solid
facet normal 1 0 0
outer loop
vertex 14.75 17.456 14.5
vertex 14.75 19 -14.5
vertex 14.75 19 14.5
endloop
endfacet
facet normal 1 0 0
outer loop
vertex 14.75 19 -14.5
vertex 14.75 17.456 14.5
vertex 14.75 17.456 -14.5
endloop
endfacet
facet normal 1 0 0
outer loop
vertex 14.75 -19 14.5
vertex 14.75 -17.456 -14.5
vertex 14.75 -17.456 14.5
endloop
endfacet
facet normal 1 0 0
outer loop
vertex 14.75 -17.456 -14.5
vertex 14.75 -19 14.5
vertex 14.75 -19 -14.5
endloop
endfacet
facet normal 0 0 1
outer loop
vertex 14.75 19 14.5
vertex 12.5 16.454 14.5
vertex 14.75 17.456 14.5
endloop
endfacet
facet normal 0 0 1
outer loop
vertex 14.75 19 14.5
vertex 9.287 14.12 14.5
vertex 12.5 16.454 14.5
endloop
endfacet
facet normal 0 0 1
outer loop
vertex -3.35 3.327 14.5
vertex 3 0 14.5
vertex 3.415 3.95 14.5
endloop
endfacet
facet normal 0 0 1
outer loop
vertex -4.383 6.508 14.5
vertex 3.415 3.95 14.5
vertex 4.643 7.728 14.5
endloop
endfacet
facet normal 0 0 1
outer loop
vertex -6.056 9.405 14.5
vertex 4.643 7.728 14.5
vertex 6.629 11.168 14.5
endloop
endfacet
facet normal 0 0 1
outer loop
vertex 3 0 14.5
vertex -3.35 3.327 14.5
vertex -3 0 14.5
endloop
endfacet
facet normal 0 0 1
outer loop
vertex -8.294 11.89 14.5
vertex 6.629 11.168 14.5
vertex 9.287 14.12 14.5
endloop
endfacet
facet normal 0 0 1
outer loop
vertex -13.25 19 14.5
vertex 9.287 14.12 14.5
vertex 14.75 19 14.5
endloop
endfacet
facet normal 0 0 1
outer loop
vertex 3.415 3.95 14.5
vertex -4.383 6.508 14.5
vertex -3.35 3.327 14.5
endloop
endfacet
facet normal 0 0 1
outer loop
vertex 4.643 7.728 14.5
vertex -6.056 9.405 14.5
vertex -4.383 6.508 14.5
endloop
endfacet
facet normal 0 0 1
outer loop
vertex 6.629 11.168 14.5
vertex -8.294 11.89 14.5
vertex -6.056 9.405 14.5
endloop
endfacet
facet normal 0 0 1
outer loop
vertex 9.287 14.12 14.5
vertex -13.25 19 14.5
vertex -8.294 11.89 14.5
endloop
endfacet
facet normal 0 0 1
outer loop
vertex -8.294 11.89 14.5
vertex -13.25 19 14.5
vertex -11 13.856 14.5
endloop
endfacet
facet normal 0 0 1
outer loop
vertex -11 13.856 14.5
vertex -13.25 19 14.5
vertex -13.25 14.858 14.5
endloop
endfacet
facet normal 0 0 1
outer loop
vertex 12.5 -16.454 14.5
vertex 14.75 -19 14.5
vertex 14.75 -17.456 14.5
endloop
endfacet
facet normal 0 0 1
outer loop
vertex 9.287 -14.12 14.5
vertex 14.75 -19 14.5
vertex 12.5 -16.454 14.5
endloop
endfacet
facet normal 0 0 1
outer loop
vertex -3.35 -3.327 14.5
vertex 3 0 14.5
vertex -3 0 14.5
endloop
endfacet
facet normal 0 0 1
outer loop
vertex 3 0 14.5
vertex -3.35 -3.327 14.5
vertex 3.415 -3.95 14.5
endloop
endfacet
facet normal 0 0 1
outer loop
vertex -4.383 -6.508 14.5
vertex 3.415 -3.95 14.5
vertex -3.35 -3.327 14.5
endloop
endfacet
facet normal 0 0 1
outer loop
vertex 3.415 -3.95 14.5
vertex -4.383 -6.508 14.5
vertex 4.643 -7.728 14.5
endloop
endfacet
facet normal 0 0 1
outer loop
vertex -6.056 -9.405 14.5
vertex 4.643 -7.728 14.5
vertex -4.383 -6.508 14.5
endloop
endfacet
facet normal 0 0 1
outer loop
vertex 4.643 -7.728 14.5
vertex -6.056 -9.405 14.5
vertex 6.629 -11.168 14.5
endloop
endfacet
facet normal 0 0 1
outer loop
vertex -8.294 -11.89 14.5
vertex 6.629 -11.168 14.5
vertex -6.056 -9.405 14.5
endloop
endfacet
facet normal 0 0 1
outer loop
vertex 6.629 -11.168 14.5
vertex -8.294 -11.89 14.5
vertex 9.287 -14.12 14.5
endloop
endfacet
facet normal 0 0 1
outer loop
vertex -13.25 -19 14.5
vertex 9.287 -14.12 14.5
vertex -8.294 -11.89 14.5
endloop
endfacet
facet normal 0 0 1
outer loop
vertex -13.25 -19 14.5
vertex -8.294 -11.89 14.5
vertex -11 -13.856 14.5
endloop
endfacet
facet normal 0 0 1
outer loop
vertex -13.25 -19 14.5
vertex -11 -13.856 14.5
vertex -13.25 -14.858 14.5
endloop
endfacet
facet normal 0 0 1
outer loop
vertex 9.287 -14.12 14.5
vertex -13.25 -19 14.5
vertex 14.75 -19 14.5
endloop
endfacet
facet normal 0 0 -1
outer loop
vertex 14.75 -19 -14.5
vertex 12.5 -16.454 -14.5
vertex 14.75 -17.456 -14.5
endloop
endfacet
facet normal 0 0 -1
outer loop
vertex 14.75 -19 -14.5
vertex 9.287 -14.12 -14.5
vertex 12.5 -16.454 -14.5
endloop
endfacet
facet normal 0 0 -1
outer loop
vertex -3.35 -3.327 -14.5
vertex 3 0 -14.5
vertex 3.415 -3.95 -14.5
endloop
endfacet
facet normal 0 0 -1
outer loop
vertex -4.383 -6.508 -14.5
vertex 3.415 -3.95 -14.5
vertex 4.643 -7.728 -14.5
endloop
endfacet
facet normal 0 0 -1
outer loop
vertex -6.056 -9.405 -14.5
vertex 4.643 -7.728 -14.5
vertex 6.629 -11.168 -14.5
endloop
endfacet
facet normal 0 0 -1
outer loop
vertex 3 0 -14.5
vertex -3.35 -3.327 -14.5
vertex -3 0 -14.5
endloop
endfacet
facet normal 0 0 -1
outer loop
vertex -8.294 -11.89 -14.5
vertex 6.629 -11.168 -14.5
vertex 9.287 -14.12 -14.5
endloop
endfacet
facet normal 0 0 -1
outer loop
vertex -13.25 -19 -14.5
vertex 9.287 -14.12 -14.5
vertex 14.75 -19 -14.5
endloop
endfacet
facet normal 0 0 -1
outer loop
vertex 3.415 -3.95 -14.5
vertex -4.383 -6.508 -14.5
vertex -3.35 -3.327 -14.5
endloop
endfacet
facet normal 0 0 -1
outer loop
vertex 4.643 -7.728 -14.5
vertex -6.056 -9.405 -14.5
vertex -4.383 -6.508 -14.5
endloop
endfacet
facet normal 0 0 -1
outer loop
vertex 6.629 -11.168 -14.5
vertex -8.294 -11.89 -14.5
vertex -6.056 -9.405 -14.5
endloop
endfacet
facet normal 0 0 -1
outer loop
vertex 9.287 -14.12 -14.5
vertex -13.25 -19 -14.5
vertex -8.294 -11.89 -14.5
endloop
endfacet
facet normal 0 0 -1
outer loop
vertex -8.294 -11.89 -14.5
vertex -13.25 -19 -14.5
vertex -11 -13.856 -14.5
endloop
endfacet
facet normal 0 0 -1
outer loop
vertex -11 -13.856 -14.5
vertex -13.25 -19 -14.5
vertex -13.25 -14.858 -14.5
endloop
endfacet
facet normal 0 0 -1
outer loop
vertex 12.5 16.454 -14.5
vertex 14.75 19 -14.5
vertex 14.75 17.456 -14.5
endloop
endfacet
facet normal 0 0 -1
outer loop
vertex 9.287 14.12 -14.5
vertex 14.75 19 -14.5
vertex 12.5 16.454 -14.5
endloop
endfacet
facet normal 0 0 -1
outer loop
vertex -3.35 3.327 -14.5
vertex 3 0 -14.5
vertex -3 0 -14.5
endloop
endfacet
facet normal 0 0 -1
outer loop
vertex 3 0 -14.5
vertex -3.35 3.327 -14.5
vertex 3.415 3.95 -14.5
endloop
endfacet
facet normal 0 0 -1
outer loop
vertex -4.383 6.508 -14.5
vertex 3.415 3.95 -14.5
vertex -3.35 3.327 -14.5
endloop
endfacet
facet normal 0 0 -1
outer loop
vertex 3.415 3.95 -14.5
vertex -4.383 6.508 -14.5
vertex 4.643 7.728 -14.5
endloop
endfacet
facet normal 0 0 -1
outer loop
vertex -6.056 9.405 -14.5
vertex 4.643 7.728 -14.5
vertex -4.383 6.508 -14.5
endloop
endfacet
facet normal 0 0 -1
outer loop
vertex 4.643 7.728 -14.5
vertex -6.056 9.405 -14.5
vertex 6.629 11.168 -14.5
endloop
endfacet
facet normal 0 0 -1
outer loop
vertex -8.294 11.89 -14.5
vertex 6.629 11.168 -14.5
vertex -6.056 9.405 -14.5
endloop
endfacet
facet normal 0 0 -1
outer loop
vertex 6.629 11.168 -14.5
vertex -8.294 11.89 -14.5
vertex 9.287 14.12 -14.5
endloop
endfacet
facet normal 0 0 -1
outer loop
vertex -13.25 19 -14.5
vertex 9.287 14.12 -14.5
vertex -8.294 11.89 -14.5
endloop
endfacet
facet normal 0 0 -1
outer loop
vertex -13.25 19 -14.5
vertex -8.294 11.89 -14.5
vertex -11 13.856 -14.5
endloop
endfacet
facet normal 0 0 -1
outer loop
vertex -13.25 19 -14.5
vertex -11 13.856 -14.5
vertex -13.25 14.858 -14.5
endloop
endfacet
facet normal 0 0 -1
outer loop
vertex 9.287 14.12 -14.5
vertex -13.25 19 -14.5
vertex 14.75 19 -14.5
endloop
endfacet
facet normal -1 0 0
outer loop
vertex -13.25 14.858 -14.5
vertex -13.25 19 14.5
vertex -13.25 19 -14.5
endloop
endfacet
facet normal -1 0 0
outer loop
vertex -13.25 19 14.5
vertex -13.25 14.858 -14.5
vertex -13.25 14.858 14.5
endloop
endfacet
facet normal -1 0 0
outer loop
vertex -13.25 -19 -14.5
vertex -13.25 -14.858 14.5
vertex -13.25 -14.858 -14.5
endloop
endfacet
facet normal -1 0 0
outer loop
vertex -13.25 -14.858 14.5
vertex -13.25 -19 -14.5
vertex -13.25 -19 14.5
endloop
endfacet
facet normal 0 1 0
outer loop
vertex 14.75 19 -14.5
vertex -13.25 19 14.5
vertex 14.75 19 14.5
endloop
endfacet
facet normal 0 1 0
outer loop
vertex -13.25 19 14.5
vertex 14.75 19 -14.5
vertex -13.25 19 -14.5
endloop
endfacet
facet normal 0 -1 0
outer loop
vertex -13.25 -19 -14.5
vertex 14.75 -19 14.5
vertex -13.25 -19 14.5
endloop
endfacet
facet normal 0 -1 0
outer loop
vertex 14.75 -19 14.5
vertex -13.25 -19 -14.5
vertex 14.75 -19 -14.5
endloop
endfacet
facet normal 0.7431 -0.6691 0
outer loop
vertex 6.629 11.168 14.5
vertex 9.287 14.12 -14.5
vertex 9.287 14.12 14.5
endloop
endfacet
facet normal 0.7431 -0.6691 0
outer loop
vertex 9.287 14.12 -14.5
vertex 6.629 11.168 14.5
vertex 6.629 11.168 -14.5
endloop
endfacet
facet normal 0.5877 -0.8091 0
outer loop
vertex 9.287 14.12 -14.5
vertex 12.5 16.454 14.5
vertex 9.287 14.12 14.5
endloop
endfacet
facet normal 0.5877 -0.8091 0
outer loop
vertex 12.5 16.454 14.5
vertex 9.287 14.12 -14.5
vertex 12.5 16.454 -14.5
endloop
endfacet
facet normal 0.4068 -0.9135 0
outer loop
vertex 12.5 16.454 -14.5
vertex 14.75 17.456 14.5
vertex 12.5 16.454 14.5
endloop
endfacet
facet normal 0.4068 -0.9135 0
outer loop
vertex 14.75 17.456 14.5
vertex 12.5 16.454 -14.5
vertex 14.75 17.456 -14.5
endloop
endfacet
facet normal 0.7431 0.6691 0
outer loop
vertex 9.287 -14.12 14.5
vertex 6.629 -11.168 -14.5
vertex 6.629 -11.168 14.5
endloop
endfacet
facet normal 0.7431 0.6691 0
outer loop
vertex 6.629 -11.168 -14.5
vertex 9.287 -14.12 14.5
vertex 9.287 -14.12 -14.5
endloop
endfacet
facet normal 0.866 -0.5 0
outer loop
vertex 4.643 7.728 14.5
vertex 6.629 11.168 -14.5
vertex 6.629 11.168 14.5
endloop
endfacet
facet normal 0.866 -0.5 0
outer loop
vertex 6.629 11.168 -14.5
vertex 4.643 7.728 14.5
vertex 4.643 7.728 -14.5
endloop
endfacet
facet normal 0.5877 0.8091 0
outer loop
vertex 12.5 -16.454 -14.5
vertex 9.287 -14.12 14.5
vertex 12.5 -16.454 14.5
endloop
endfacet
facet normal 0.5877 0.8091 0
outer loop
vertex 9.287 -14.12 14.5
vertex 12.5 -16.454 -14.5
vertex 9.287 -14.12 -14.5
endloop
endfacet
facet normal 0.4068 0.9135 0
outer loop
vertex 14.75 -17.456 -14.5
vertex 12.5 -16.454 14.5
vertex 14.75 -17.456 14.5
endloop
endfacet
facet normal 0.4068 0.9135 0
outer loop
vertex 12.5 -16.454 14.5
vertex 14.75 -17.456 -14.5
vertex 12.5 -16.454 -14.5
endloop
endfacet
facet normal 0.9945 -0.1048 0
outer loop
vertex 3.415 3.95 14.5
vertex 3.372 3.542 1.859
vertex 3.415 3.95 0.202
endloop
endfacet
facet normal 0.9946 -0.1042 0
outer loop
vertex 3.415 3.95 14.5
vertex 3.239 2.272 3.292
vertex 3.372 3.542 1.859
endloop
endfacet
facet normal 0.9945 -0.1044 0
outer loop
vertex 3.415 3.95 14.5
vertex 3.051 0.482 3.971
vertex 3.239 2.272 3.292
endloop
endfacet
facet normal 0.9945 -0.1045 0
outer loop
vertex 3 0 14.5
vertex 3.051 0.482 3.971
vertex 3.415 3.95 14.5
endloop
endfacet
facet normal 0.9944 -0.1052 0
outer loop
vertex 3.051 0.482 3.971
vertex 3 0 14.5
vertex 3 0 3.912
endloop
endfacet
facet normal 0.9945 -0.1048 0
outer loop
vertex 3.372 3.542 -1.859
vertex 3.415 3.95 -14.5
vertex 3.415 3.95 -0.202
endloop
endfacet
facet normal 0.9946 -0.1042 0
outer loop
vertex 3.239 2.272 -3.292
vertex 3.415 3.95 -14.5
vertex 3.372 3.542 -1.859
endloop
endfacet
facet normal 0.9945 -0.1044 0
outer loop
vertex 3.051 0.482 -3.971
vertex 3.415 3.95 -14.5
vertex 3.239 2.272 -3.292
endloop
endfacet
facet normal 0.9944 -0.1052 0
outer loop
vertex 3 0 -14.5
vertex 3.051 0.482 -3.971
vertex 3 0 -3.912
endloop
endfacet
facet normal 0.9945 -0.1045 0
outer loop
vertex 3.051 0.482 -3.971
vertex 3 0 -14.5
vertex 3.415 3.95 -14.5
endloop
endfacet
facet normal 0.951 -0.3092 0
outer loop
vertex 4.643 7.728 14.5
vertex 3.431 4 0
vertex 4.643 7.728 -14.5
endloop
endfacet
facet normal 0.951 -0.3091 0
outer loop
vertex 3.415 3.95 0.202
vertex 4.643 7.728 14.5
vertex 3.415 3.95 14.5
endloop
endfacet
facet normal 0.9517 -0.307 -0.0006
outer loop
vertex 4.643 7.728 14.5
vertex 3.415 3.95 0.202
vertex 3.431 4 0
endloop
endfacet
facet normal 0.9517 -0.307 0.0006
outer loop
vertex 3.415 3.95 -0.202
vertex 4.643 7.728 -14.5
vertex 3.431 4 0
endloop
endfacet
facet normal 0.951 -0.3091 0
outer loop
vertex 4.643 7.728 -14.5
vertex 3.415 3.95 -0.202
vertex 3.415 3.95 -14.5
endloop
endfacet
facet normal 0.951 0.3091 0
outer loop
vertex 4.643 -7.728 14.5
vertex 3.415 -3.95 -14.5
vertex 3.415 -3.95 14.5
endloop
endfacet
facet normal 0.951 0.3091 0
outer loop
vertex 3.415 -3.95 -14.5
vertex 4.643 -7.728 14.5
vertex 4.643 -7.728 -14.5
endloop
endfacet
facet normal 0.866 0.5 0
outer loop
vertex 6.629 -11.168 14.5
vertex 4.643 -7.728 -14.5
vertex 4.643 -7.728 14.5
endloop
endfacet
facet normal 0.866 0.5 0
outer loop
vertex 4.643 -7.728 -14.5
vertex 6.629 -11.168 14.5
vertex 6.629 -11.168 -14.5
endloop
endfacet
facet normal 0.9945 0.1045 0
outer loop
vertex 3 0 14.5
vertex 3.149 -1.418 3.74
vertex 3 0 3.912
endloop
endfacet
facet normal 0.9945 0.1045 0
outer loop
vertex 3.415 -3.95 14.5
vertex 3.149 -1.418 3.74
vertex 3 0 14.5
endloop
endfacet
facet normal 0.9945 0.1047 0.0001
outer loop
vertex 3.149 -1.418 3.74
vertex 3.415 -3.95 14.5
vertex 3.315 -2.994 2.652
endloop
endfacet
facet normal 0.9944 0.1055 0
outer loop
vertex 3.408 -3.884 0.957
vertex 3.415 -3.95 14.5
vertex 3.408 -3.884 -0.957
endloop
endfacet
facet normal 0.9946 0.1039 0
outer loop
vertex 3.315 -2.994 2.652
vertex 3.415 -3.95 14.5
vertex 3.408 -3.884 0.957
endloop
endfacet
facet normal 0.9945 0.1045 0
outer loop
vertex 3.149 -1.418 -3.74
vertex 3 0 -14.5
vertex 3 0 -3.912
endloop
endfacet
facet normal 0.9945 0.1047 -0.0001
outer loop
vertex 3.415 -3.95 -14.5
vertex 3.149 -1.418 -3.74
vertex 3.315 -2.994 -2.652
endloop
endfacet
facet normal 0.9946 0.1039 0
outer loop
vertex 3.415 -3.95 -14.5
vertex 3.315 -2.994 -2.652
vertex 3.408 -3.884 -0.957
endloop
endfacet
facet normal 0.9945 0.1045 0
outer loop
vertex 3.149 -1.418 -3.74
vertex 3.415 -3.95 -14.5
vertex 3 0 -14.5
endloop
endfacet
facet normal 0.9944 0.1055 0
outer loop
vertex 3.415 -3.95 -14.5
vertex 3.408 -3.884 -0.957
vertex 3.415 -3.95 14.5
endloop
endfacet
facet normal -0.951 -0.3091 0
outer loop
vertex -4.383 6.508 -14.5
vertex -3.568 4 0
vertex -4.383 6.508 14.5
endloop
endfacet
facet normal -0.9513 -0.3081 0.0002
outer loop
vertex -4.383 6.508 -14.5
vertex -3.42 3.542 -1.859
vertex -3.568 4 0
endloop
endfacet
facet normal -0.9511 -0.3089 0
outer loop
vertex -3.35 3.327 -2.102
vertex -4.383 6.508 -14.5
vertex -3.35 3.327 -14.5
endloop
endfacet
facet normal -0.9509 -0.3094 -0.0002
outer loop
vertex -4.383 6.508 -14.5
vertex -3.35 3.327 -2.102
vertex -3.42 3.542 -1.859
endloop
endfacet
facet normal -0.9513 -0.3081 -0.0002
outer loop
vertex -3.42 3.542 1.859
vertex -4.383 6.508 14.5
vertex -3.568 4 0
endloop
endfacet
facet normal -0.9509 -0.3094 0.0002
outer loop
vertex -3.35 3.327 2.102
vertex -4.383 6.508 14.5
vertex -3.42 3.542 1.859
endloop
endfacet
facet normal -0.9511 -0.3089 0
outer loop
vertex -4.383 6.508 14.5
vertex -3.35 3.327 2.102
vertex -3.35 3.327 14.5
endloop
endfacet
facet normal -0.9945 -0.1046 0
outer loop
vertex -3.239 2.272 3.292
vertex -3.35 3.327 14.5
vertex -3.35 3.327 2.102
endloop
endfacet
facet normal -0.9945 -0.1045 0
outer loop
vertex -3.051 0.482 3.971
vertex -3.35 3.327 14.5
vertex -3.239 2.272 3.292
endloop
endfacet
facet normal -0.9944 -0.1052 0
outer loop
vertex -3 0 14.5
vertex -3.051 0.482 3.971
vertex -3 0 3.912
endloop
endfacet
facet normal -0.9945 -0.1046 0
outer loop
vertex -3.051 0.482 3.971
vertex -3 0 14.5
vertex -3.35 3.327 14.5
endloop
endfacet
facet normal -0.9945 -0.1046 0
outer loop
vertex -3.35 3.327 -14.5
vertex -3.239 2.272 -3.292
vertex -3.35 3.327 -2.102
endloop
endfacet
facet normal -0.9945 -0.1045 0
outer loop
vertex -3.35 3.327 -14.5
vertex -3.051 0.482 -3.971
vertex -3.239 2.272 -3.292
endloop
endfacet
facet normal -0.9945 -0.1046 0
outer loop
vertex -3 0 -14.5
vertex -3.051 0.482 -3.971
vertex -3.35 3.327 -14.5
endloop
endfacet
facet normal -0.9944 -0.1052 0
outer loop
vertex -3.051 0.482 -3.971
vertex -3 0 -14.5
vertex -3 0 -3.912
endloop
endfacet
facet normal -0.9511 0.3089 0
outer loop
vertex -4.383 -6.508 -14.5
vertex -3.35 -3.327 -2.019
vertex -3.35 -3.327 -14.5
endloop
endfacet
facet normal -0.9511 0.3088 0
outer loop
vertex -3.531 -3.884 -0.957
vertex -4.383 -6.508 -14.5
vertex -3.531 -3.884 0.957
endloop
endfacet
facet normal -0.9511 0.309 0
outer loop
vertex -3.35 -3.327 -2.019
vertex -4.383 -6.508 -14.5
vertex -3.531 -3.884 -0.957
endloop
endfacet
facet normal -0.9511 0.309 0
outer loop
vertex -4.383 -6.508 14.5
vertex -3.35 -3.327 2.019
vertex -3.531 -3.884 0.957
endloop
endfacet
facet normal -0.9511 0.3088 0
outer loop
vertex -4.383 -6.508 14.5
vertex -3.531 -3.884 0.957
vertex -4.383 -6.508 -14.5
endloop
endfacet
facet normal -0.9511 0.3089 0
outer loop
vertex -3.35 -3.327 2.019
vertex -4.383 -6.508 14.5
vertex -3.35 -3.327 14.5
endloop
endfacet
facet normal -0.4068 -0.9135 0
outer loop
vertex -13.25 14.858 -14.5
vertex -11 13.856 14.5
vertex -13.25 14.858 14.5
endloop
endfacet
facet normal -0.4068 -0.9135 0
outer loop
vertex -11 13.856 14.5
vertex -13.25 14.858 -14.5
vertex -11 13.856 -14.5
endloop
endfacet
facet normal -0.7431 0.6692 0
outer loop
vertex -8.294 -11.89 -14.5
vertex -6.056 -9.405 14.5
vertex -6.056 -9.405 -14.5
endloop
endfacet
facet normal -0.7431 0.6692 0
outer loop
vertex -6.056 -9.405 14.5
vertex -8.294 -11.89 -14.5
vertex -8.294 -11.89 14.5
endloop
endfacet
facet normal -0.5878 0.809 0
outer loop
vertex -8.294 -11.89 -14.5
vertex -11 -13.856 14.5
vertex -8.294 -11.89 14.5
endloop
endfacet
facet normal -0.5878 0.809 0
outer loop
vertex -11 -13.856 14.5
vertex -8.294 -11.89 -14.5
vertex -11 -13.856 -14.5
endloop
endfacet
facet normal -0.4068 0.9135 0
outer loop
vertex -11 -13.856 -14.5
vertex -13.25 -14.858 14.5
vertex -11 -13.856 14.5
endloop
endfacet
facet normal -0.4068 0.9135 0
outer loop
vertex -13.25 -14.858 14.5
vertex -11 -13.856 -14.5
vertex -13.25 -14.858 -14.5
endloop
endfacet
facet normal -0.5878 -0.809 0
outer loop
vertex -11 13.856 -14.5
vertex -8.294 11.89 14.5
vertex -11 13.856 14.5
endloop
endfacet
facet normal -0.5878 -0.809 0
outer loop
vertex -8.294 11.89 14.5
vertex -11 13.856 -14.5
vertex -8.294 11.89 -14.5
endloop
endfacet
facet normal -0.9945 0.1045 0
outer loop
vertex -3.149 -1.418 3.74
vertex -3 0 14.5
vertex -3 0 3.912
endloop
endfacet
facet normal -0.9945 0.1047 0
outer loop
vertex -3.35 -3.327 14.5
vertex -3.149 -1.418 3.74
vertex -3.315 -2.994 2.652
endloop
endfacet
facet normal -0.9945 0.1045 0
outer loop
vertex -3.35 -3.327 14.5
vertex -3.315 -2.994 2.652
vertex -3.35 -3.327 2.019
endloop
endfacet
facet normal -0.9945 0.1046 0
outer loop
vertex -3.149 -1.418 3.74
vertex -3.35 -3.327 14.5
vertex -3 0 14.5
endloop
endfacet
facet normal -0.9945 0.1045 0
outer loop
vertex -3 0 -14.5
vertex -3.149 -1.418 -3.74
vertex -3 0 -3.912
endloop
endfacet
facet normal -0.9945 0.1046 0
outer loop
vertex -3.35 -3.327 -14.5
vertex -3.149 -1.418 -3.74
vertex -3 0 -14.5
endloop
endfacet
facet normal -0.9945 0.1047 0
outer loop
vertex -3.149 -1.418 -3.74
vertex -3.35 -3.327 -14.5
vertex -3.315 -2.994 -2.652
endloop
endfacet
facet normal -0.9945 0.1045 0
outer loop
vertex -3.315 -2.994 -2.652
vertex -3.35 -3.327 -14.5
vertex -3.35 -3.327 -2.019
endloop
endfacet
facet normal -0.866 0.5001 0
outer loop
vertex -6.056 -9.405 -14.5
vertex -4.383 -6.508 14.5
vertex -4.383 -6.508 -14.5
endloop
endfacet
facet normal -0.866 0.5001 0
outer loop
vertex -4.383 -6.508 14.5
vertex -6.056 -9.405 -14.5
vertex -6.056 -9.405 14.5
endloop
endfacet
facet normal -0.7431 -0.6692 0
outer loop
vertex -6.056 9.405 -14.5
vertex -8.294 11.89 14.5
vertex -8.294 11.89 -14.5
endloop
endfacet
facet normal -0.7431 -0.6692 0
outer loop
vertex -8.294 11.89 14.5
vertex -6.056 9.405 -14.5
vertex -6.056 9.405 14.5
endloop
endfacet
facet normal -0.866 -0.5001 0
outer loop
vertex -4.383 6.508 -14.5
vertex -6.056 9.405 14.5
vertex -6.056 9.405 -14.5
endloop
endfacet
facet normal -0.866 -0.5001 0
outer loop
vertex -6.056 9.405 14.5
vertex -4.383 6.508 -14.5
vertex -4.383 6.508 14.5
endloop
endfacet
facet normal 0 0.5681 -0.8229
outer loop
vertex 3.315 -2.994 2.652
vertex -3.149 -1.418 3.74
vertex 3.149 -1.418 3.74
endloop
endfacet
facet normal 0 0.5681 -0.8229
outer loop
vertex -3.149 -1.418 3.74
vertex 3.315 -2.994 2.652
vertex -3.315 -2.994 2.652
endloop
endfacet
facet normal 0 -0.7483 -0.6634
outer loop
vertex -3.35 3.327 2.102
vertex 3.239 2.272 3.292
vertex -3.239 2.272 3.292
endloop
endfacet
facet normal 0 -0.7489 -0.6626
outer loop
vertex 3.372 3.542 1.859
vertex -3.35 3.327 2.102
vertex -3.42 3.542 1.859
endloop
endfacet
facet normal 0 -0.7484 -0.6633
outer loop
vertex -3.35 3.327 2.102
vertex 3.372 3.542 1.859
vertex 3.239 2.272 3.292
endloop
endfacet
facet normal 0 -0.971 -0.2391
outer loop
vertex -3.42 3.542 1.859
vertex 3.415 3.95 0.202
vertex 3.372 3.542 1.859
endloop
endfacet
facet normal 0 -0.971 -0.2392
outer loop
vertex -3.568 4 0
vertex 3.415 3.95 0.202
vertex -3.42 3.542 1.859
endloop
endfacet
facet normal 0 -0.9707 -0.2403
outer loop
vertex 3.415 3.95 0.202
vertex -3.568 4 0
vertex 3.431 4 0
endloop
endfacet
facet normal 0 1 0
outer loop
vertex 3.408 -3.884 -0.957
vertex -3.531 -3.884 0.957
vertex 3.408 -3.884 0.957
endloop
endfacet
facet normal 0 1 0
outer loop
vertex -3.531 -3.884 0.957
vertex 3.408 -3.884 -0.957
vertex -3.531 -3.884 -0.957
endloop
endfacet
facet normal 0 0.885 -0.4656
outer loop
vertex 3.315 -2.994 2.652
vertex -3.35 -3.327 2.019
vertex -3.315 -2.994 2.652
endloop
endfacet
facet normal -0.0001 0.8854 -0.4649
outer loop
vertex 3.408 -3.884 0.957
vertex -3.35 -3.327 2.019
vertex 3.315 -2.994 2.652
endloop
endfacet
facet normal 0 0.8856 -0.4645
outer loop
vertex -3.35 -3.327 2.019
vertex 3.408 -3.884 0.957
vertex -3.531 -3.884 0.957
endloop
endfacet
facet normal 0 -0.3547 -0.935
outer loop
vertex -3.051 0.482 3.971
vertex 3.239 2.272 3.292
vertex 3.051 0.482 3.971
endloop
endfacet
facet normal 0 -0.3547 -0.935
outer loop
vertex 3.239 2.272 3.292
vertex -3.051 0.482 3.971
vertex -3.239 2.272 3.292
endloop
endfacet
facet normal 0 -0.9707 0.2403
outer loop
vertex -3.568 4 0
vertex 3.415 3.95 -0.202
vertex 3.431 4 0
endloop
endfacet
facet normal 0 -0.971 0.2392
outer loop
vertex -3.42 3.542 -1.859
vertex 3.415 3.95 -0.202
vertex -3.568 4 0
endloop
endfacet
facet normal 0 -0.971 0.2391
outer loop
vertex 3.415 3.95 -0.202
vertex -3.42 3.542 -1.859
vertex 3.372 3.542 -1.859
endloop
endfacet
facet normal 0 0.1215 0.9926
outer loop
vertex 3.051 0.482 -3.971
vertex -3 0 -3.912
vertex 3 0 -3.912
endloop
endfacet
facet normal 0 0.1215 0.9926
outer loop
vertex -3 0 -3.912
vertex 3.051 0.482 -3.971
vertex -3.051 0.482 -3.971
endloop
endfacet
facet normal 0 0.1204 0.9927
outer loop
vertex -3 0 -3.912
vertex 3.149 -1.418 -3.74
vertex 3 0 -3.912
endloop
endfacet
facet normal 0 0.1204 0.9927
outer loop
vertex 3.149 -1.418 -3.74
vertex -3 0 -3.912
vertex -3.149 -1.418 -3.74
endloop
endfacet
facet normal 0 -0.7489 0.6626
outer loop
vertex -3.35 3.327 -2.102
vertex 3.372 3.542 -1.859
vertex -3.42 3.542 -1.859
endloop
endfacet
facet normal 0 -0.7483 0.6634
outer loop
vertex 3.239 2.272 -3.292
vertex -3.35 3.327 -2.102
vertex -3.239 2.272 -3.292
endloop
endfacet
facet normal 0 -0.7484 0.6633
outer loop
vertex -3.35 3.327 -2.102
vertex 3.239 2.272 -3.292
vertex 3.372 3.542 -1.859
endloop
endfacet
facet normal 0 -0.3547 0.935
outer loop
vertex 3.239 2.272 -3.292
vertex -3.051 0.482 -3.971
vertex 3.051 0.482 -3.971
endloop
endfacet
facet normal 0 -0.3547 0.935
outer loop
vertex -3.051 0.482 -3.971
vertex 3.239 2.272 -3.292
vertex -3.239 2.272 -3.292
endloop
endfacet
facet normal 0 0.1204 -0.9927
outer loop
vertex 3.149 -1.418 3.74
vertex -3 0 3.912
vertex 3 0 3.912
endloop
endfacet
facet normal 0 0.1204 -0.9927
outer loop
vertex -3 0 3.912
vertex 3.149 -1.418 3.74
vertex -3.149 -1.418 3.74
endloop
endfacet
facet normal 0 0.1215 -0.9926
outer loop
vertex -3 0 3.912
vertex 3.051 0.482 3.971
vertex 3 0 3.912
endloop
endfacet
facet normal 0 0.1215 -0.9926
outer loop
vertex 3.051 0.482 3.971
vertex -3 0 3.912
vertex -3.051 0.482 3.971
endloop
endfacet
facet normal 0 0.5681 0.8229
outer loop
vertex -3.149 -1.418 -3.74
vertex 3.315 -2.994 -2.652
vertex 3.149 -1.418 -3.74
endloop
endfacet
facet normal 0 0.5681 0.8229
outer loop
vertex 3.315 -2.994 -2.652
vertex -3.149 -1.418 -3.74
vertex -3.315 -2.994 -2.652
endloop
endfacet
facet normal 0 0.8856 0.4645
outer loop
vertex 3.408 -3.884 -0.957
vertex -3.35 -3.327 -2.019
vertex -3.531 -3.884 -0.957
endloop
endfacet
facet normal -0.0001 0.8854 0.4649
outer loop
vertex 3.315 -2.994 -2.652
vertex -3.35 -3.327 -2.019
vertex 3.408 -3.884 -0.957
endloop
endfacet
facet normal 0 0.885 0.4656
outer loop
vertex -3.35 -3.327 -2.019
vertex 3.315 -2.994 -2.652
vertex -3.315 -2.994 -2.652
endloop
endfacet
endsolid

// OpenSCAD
radius1 = 19;
radius2 = 16;
separation = 6;
height = 30;
hole1 = 4;
module trampclamp()
{
	
		
	difference() {
		translate([0.25*(radius1-radius2), 0, 0])
		cube([0.8*(radius1 + radius2),2*radius1 , height-1 ], center = true);
		translate([radius1+separation/2, 0, 0])
		cylinder(h = height, r = radius1, center = true);	
		translate([-(radius2+separation/2), 0, 0])
		cylinder(h = height, r = radius2, center = true);	
		rotate([90,0,90])
		cylinder(h = separation*2, r = hole1, center = true);
				
	}
		
}

trampclamp();
